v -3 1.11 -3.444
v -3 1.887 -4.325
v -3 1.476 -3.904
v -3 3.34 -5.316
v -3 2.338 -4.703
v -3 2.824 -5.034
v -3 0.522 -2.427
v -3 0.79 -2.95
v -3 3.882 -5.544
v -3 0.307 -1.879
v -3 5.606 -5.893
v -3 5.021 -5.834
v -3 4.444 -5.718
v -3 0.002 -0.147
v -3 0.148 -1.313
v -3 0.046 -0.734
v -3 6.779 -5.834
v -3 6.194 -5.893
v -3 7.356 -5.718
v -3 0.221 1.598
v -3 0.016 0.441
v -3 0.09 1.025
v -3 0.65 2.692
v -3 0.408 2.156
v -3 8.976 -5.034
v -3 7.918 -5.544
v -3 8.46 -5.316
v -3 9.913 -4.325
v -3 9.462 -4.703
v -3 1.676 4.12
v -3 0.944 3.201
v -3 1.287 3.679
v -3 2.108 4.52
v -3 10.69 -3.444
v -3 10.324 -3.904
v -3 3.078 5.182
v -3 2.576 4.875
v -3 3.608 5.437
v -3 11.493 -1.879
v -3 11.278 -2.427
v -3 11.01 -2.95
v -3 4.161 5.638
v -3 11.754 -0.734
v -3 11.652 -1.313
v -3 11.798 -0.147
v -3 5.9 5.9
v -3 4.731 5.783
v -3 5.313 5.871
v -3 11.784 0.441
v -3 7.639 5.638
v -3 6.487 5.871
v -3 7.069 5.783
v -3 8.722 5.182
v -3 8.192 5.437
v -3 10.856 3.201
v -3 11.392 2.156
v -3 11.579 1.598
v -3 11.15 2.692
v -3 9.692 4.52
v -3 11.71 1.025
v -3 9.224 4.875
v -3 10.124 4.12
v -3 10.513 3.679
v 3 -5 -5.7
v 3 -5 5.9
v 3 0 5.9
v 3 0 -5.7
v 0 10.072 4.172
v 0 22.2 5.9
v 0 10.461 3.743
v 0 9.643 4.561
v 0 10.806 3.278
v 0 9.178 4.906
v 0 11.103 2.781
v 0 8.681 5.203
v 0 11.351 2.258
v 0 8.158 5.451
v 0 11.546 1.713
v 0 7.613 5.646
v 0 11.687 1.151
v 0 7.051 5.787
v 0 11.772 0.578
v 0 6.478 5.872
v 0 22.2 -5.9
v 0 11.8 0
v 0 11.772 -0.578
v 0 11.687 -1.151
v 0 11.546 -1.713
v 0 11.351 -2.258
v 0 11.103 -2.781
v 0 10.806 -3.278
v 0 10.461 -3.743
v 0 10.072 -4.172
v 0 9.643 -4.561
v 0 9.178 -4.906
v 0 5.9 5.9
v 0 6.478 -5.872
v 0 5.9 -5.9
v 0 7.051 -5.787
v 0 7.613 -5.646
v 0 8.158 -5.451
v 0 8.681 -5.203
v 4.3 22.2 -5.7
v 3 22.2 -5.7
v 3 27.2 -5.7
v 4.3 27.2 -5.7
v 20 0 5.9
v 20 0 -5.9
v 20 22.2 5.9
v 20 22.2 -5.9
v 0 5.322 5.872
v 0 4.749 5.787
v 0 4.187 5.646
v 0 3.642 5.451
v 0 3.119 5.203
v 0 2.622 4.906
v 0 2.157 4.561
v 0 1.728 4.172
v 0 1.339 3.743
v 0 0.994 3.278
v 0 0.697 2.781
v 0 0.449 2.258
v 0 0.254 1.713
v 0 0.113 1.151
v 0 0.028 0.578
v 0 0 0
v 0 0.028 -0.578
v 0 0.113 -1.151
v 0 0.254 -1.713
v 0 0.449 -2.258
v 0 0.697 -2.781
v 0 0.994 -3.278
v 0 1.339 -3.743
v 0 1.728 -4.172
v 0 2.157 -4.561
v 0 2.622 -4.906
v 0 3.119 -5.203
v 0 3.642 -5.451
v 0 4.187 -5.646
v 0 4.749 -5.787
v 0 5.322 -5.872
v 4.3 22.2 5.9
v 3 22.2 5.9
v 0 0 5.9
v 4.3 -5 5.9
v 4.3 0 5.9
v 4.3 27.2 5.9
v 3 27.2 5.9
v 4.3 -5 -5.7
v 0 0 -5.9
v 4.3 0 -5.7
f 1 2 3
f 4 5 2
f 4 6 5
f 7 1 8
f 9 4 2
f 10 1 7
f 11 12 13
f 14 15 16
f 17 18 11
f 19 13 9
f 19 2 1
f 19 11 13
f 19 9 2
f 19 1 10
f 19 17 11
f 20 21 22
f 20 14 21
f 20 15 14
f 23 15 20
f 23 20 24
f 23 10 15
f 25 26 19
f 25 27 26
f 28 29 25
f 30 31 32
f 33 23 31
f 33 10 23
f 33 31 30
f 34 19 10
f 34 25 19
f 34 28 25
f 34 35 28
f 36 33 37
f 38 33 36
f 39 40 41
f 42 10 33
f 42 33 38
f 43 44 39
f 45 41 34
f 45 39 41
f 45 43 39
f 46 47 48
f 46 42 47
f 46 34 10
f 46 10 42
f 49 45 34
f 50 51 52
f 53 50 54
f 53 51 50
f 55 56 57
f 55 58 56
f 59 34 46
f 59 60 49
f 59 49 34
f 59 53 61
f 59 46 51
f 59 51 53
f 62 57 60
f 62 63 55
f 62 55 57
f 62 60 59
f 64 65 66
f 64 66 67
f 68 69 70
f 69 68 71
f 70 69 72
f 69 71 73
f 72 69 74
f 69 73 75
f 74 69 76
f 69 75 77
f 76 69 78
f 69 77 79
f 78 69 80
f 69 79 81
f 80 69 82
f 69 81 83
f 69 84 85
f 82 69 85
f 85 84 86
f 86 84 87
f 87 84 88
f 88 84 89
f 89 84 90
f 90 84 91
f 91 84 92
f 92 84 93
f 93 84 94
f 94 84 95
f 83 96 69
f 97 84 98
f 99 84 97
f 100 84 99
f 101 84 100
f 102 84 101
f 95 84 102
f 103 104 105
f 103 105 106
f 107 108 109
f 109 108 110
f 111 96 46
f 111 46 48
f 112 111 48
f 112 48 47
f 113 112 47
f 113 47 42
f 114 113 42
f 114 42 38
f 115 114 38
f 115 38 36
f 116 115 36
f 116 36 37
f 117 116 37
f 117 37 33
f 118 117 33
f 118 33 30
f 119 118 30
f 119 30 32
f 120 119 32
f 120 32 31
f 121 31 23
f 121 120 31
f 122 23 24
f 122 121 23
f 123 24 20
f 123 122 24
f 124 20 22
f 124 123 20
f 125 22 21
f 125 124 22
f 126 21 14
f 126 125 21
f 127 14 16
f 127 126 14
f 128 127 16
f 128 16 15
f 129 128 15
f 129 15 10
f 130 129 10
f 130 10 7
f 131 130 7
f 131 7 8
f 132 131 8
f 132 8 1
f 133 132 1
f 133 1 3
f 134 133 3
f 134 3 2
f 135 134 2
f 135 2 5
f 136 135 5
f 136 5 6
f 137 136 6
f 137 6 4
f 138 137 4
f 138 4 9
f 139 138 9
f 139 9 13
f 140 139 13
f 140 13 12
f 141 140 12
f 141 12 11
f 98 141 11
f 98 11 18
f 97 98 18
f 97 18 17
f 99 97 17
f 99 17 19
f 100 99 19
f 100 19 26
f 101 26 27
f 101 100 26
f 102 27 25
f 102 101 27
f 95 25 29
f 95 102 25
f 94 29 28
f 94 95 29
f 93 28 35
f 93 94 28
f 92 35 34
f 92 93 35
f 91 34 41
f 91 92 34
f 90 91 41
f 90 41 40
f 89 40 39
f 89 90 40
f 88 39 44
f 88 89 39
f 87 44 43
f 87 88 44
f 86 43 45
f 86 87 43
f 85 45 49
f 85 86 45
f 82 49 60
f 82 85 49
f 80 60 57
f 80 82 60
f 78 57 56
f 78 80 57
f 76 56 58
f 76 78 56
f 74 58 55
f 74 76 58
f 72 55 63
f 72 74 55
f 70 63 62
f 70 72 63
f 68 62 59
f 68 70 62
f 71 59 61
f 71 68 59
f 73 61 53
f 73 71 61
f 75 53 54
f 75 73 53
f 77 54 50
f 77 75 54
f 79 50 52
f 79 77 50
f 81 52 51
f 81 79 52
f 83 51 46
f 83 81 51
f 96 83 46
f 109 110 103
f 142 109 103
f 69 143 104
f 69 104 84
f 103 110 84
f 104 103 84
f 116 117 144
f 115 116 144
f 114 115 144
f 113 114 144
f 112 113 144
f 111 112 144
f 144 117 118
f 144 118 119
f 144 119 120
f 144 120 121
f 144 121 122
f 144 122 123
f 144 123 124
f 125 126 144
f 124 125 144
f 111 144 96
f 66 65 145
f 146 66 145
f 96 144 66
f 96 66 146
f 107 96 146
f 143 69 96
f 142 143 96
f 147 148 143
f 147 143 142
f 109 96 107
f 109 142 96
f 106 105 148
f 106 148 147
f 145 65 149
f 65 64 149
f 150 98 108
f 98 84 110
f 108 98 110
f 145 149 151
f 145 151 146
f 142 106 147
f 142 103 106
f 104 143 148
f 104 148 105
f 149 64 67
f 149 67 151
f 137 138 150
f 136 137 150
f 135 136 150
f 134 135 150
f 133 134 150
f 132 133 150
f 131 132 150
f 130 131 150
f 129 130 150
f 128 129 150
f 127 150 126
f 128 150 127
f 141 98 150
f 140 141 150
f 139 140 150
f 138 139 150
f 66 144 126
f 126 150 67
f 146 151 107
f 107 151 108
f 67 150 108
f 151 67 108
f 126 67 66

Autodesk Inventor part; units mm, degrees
ref_plane "YZ Plane" through (0, 0, 0) normal (1, 0, 0) x (0, 1, 0)
ref_plane "XZ Plane" through (0, 0, 0) normal (0, 1, 0) x (-1, 0, 0)
ref_plane "XY Plane" through (0, 0, 0) normal (0, 0, 1) x (1, 0, 0)
sketch "Sketch1" plane through (0, 0, 0) normal (0, 0, 1) x (1, 0, 0)
  line L0 (0, 0) -> (20, 0)
  line L1 (20, 0) -> (20, 22.2)
  line L2 (20, 22.2) -> (0, 22.2)
  line L3 (0, 22.2) -> (0, 0)
  dimension "d0" = 20
  dimension "d1" = 22.2
extrude "Extrusion1" add sketch "Sketch1" along normal mid plane 11.8
sketch "Sketch2" plane through (0, 0, 5.9) normal (-1, 0, 0) x (0, 0, 1)
  circle A0 centre (-5.9, 5.9) radius 5.9
  line L0 (0, 0) -> (-11.8, 0) projected
  line L1 (0, 22.2) -> (0, 0) projected
  point P0 (-5.9, 0)
  dimension "d4" = 5.9
  dimension "d5" = 5.9
  dimension "d6" = 11.8
extrude "Extrusion2" add sketch "Sketch2" along normal blind 3 contours A0
sketch "Sketch3" plane through (0, 22.2, 5.9) normal (0, 1, 0) x (1, 0, 0)
  line L0 (0, 0) -> (20, 0) projected
  line L1 (3, 11.6) -> (4.3, 11.6)
  line L2 (4.3, 11.6) -> (4.3, 0)
  line L3 (4.3, 0) -> (3, 0)
  line L4 (3, 0) -> (3, 11.6)
  line L5 (0, 11.8) -> (0, 0) projected
  point P0 (0, 5.9)
  dimension "d9" = 3
  dimension "d10" = 1.3
  dimension "d11" = 11.6
extrude "Extrusion3" add sketch "Sketch3" along normal blind 5 and the other way blind 27.2
properties part number "Servo"
